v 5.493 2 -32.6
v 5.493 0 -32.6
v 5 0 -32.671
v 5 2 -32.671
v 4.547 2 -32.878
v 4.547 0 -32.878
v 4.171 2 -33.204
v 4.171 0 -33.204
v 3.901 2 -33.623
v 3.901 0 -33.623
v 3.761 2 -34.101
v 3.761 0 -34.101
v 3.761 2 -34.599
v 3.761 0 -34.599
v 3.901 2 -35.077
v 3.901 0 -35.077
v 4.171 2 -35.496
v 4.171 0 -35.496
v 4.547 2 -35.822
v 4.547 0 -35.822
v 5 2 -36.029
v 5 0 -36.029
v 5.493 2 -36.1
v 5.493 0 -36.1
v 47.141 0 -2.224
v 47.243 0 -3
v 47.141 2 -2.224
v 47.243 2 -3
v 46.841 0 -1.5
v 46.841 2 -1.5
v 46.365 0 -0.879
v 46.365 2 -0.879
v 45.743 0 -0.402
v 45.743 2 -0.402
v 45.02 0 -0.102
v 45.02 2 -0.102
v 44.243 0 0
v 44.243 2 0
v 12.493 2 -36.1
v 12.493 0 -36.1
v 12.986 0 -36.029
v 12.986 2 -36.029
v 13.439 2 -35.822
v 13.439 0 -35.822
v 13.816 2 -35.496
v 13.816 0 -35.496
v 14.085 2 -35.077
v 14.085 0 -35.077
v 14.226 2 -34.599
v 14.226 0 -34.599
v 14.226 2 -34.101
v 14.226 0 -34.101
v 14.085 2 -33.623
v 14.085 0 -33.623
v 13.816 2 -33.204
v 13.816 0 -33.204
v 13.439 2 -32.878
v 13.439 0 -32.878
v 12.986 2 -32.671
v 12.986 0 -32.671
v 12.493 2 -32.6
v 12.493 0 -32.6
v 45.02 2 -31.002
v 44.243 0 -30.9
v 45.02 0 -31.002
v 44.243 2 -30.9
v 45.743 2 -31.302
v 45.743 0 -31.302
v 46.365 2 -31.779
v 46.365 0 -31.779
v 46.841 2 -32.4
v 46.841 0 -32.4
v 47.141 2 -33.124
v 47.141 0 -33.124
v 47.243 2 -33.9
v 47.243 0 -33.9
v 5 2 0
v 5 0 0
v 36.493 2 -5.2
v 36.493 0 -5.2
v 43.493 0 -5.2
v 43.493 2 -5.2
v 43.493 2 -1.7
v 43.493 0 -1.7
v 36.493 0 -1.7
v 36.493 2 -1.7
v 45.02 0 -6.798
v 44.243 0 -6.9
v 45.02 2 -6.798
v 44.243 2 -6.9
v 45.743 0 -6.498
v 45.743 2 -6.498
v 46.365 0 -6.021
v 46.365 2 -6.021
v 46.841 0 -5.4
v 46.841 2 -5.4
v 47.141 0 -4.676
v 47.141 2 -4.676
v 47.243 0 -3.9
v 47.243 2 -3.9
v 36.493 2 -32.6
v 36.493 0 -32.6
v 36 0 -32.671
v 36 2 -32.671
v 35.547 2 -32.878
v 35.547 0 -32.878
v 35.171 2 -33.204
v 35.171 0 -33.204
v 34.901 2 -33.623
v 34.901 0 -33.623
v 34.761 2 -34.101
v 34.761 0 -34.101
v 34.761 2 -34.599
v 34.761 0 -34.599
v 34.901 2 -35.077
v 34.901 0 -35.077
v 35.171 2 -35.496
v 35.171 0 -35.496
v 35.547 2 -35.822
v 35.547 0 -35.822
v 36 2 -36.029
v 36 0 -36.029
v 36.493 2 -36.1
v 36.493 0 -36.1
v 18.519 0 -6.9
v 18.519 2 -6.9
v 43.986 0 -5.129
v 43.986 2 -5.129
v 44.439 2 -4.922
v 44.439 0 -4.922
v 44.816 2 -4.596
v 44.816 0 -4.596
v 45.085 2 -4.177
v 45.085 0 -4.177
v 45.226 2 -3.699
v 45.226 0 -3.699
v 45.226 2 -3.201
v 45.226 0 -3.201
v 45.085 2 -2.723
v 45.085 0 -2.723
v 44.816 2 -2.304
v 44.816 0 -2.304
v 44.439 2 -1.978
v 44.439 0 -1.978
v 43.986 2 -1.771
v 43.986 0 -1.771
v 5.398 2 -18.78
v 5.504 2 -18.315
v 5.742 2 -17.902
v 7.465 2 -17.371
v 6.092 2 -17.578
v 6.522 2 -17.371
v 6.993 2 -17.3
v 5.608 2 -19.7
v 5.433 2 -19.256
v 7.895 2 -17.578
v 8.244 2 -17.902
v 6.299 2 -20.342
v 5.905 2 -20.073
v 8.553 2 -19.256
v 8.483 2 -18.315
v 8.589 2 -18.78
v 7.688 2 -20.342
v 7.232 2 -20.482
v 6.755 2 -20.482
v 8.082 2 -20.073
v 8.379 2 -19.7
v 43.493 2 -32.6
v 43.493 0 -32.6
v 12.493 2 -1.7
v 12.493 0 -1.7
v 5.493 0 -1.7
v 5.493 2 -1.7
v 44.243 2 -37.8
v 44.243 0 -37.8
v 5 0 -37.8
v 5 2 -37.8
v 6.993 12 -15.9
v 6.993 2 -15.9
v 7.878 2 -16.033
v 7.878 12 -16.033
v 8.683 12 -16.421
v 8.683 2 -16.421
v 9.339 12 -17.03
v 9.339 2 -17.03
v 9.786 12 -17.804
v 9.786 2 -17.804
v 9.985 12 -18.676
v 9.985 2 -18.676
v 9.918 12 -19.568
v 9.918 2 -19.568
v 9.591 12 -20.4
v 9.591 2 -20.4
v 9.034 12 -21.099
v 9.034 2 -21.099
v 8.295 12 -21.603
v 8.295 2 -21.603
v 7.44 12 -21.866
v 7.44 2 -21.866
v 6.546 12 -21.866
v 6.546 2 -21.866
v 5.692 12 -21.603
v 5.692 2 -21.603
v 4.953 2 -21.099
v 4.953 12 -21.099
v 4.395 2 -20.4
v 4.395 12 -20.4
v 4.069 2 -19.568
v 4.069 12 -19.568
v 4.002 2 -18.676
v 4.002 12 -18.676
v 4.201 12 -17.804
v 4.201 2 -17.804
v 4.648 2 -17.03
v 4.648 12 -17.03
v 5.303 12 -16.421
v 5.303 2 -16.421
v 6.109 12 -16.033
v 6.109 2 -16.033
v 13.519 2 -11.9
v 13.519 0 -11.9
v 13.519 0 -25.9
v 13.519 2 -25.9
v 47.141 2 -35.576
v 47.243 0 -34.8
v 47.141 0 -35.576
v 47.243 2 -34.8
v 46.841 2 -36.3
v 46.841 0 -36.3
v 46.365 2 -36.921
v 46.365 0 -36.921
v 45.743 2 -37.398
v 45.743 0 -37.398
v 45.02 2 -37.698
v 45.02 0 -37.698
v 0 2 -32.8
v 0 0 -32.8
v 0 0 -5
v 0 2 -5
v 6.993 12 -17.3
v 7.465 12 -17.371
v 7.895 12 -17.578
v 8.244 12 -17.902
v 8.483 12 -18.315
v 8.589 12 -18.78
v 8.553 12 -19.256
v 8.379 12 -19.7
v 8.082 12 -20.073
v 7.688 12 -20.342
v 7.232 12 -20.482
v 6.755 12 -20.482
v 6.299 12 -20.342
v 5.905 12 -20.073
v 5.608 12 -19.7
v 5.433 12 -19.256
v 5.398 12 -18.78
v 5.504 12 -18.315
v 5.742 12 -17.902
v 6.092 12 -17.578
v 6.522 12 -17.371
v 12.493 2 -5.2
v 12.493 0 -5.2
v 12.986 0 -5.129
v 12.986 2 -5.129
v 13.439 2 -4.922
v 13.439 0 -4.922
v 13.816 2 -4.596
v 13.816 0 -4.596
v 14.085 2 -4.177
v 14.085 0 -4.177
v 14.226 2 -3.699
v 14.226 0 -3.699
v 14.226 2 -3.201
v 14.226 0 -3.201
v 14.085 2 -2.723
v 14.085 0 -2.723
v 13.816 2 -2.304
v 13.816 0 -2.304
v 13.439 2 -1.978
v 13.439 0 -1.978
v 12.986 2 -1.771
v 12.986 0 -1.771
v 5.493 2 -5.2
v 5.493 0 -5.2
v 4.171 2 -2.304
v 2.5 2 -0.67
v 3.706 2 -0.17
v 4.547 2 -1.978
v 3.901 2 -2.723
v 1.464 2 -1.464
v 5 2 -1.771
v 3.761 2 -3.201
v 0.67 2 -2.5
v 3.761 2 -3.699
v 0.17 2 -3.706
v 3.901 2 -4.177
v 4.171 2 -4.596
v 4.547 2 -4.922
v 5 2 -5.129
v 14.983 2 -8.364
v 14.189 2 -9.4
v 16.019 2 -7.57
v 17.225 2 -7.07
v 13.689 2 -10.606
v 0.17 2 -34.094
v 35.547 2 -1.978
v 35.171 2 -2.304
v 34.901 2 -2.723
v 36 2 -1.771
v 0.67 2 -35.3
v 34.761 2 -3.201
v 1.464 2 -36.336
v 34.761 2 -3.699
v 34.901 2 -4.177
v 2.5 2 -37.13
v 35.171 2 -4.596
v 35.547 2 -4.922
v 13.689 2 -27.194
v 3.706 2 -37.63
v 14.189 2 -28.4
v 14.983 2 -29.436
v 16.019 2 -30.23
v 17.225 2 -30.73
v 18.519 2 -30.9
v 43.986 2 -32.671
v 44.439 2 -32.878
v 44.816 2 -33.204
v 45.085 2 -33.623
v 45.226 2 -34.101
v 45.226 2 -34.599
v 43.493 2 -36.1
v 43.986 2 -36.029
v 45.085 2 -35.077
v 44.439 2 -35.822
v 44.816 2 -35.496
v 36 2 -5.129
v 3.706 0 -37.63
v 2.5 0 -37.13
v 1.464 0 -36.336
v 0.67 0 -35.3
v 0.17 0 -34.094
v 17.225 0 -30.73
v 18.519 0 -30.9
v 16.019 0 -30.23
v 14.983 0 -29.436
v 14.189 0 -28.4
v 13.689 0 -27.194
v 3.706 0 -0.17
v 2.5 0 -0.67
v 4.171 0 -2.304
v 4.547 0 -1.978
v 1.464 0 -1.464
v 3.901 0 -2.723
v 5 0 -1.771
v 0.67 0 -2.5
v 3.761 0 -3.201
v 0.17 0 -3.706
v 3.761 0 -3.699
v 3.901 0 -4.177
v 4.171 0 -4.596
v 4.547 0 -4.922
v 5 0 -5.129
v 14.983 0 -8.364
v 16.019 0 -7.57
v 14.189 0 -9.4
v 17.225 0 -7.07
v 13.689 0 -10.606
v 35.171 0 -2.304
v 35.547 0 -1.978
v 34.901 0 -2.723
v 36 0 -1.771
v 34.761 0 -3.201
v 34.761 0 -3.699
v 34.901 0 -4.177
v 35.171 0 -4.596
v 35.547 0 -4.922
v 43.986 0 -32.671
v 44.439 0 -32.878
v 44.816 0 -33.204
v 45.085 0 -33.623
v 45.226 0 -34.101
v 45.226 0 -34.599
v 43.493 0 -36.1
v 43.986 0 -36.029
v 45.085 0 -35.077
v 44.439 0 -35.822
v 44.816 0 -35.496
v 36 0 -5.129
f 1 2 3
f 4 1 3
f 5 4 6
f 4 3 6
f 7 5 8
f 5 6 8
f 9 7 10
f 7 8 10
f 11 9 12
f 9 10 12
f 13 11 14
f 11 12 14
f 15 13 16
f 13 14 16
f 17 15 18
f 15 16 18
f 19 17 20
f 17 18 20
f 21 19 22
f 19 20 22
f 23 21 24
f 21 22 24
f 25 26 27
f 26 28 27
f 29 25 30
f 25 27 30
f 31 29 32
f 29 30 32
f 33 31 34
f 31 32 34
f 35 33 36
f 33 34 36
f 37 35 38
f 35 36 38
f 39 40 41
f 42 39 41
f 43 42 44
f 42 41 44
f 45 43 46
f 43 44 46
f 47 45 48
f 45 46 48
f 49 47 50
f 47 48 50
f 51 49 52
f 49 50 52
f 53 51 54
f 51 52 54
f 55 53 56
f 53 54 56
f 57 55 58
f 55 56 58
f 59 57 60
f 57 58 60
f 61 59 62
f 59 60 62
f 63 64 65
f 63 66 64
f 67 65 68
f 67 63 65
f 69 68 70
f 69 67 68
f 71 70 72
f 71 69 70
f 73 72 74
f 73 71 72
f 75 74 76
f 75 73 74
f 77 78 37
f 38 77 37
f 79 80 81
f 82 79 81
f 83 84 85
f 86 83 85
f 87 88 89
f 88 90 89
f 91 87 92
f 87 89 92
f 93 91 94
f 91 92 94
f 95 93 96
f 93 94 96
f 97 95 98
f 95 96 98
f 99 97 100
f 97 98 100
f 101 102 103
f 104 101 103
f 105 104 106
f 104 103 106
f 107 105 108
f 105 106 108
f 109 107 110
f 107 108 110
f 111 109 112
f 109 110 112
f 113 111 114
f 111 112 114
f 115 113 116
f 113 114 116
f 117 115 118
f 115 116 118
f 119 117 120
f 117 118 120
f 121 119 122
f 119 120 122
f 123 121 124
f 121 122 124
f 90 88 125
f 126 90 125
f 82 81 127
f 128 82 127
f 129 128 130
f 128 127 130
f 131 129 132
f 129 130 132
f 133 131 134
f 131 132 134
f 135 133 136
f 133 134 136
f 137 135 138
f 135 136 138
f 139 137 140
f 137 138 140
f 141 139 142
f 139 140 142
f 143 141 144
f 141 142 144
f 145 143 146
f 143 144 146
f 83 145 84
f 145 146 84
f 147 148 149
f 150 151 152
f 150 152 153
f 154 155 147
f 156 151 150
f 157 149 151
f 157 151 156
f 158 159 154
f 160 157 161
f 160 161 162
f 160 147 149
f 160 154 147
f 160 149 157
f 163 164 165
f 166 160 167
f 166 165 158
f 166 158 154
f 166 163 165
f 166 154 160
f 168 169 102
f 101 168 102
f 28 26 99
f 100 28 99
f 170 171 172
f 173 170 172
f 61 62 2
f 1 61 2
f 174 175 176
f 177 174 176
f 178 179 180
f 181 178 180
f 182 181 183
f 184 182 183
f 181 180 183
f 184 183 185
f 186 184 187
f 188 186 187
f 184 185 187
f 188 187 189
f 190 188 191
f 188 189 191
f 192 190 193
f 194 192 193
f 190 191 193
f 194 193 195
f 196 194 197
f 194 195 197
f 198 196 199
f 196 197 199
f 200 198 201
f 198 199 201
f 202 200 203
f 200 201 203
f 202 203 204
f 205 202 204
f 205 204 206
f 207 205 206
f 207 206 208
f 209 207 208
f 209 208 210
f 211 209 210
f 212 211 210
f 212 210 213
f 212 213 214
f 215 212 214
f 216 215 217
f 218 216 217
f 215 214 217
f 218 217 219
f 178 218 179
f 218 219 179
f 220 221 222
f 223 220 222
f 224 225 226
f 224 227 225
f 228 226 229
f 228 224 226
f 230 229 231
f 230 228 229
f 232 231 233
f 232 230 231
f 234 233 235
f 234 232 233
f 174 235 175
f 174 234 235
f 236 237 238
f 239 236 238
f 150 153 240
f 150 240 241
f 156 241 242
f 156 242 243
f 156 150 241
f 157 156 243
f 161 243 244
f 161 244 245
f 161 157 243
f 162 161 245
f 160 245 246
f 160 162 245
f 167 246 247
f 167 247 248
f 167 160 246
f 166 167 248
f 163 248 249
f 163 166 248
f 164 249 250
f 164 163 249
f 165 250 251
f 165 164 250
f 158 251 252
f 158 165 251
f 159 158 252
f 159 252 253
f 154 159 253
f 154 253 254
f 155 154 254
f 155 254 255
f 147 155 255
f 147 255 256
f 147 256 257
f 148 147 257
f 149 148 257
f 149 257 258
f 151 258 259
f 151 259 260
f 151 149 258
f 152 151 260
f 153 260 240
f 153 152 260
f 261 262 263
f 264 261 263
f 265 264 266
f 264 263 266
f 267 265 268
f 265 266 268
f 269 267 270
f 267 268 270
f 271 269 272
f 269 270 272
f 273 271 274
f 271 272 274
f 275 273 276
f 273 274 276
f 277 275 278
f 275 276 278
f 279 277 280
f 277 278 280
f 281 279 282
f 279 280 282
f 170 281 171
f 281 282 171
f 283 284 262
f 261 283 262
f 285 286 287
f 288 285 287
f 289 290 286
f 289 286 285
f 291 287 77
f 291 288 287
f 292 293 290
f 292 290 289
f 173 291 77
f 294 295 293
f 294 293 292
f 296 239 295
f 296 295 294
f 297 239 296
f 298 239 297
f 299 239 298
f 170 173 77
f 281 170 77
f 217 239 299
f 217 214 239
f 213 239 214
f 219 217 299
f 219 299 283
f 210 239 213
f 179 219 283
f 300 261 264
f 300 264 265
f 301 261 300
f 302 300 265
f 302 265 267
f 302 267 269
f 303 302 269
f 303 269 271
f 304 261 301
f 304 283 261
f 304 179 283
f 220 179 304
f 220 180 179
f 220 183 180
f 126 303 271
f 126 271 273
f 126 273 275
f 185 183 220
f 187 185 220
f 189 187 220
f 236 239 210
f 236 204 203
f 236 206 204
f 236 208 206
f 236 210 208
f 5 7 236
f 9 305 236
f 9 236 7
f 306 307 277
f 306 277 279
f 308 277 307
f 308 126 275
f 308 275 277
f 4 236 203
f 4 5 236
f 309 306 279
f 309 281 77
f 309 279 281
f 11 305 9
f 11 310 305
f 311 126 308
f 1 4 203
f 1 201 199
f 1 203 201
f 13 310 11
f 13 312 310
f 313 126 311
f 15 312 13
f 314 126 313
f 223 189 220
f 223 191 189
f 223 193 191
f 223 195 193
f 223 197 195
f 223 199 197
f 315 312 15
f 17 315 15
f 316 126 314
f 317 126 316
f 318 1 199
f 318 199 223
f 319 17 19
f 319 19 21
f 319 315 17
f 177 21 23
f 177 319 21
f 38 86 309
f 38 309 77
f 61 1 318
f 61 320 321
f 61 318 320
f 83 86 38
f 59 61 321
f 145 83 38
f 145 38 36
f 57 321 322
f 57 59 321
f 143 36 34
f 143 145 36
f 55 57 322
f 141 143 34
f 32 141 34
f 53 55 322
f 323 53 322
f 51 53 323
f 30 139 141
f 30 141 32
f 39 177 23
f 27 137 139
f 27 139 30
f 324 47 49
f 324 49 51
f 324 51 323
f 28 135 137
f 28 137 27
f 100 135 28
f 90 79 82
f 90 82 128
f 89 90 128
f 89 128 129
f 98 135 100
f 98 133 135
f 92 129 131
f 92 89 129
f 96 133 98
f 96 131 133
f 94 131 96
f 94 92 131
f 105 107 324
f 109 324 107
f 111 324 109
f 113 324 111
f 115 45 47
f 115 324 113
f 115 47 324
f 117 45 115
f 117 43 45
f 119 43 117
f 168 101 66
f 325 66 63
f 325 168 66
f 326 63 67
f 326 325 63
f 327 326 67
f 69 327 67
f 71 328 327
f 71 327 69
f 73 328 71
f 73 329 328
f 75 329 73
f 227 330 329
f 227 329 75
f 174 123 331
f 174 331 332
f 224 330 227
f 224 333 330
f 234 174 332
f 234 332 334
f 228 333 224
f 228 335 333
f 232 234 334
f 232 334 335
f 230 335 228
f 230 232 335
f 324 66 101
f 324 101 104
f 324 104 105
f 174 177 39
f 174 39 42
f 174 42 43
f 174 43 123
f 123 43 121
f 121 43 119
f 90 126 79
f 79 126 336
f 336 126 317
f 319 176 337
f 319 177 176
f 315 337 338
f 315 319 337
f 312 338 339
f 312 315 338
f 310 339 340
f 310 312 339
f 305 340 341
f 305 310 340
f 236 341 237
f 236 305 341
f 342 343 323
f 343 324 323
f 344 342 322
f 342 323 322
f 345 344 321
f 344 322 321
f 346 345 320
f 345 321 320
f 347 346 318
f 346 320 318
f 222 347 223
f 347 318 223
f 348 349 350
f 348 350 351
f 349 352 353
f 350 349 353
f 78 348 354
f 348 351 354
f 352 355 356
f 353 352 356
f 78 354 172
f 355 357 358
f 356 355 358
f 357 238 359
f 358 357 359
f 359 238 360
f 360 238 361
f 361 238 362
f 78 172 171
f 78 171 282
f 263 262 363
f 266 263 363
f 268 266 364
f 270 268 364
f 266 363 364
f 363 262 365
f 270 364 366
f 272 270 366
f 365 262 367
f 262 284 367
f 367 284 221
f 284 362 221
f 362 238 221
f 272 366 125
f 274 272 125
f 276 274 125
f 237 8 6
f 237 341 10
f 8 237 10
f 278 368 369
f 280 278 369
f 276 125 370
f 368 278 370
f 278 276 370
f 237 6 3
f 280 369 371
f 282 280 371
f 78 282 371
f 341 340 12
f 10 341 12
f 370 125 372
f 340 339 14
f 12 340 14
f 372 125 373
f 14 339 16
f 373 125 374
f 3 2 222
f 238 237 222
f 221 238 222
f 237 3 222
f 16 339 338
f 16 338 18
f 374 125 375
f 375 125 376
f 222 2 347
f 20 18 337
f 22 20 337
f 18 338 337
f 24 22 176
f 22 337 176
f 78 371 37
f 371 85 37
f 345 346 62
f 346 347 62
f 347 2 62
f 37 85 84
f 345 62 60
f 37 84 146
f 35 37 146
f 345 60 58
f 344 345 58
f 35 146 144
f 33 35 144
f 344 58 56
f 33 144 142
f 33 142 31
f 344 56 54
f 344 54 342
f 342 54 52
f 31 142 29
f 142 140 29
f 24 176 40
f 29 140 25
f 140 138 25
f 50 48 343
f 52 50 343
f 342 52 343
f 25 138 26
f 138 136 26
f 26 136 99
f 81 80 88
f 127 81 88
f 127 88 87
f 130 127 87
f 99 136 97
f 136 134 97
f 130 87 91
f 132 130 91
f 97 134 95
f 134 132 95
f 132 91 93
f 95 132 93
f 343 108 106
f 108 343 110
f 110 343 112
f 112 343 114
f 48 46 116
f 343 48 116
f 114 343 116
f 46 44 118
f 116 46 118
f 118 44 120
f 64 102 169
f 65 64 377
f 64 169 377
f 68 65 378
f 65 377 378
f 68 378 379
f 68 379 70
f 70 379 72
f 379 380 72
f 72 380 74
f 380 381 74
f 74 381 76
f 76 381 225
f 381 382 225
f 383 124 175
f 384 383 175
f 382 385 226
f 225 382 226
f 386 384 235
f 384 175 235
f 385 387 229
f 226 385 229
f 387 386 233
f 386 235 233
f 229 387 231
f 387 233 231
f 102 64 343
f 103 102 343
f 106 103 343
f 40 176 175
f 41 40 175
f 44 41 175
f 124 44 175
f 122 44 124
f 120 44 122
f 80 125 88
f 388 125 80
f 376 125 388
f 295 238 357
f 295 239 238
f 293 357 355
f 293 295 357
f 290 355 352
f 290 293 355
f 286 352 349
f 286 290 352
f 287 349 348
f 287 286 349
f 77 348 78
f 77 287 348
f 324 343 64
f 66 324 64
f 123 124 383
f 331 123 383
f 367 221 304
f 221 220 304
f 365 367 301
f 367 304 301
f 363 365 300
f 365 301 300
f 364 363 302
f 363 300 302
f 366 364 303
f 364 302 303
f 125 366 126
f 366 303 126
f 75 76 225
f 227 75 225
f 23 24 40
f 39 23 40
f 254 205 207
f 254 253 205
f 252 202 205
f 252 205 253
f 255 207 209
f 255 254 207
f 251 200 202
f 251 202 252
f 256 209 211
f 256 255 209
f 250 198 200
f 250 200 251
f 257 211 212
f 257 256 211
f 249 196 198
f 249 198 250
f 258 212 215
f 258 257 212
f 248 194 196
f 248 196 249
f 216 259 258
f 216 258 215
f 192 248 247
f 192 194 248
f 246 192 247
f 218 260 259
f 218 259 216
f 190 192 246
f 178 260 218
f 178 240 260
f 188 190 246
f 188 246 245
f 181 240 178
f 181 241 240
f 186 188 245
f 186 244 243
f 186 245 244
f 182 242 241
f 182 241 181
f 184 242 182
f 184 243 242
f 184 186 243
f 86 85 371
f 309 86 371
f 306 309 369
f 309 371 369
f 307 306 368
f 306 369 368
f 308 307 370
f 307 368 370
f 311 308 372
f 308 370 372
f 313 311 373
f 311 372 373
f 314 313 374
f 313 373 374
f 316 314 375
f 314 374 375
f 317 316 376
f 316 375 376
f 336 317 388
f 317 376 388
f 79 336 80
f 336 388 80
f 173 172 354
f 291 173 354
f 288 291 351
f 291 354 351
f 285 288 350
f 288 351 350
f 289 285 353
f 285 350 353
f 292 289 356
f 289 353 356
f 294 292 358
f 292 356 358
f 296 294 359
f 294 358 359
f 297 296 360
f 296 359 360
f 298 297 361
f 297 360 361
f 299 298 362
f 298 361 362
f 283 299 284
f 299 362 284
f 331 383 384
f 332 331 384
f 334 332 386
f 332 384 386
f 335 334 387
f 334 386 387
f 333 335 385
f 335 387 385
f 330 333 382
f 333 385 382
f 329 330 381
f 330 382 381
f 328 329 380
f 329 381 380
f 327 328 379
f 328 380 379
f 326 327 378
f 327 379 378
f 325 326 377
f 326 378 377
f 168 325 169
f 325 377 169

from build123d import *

# Parameters (mm, degrees)
BOSS_EXTRUDE1_DEPTH = 2
FILLET1_R           = 5
FILLET2_R           = 3
SKETCH2_R           = 3
SKETCH2_R_2         = 1.6
BOSS_EXTRUDE2_DEPTH = 10


with BuildPart() as part:
    # Sketch1 → Boss-Extrude1 (new body)
    with BuildSketch(Plane(origin=(0, 0, 0), x_dir=(1, 0, 0), z_dir=(0, 1, 0))):
        Polygon((47.24332582, 30.9), (47.24332582, 37.8), (0, 37.8), (0, 0), (47.24332582, 0), (47.24332582, 6.9), (13.518849419, 6.9), (13.518849419, 30.9), align=None)
        with BuildLine():
            Line((5.49332582, 36.1), (12.49332582, 36.1))
            ThreePointArc((12.49332582, 36.1), (14.24332582, 34.35), (12.49332582, 32.6))
            Line((12.49332582, 32.6), (5.49332582, 32.6))
            ThreePointArc((5.49332582, 32.6), (3.74332582, 34.35), (5.49332582, 36.1))
        make_face(mode=Mode.SUBTRACT)
        with BuildLine():
            Line((36.49332582, 36.1), (43.49332582, 36.1))
            ThreePointArc((43.49332582, 36.1), (45.24332582, 34.35), (43.49332582, 32.6))
            Line((43.49332582, 32.6), (36.49332582, 32.6))
            ThreePointArc((36.49332582, 32.6), (34.74332582, 34.35), (36.49332582, 36.1))
        make_face(mode=Mode.SUBTRACT)
        with BuildLine():
            Line((5.49332582, 5.2), (12.49332582, 5.2))
            ThreePointArc((12.49332582, 5.2), (14.24332582, 3.45), (12.49332582, 1.7))
            Line((12.49332582, 1.7), (5.49332582, 1.7))
            ThreePointArc((5.49332582, 1.7), (3.74332582, 3.45), (5.49332582, 5.2))
        make_face(mode=Mode.SUBTRACT)
        with BuildLine():
            Line((36.49332582, 5.2), (43.49332582, 5.2))
            ThreePointArc((43.49332582, 5.2), (45.24332582, 3.45), (43.49332582, 1.7))
            Line((43.49332582, 1.7), (36.49332582, 1.7))
            ThreePointArc((36.49332582, 1.7), (34.74332582, 3.45), (36.49332582, 5.2))
        make_face(mode=Mode.SUBTRACT)
    extrude(amount=BOSS_EXTRUDE1_DEPTH)

    # Fillet1
    fillet1_edges = [part.edges().sort_by_distance(p)[0] for p in [
        (13.518849419, 1, -6.9),
        (0, 1, 0),
        (0, 1, -37.8),
        (13.518849419, 1, -30.9),
    ]]
    fillet(fillet1_edges, radius=FILLET1_R)

    # Fillet2
    fillet2_edges = [part.edges().sort_by_distance(p)[0] for p in [
        (47.24332582, 1, -6.9),
        (47.24332582, 1, 0),
        (47.24332582, 1, -37.8),
        (47.24332582, 1, -30.9),
    ]]
    fillet(fillet2_edges, radius=FILLET2_R)

    # Sketch2 → Boss-Extrude2 (add)
    with BuildSketch(Plane(origin=(0, 2, 0), x_dir=(1, 0, 0), z_dir=(0, 1, 0))):
        with Locations(Location((6.99332582, 18.9, 0), (0, 0, 270))):
            Circle(SKETCH2_R)
        with Locations(Location((6.99332582, 18.9, 0), (0, 0, 270))):
            Circle(SKETCH2_R_2, mode=Mode.SUBTRACT)
    extrude(amount=BOSS_EXTRUDE2_DEPTH)


solid = part.part
